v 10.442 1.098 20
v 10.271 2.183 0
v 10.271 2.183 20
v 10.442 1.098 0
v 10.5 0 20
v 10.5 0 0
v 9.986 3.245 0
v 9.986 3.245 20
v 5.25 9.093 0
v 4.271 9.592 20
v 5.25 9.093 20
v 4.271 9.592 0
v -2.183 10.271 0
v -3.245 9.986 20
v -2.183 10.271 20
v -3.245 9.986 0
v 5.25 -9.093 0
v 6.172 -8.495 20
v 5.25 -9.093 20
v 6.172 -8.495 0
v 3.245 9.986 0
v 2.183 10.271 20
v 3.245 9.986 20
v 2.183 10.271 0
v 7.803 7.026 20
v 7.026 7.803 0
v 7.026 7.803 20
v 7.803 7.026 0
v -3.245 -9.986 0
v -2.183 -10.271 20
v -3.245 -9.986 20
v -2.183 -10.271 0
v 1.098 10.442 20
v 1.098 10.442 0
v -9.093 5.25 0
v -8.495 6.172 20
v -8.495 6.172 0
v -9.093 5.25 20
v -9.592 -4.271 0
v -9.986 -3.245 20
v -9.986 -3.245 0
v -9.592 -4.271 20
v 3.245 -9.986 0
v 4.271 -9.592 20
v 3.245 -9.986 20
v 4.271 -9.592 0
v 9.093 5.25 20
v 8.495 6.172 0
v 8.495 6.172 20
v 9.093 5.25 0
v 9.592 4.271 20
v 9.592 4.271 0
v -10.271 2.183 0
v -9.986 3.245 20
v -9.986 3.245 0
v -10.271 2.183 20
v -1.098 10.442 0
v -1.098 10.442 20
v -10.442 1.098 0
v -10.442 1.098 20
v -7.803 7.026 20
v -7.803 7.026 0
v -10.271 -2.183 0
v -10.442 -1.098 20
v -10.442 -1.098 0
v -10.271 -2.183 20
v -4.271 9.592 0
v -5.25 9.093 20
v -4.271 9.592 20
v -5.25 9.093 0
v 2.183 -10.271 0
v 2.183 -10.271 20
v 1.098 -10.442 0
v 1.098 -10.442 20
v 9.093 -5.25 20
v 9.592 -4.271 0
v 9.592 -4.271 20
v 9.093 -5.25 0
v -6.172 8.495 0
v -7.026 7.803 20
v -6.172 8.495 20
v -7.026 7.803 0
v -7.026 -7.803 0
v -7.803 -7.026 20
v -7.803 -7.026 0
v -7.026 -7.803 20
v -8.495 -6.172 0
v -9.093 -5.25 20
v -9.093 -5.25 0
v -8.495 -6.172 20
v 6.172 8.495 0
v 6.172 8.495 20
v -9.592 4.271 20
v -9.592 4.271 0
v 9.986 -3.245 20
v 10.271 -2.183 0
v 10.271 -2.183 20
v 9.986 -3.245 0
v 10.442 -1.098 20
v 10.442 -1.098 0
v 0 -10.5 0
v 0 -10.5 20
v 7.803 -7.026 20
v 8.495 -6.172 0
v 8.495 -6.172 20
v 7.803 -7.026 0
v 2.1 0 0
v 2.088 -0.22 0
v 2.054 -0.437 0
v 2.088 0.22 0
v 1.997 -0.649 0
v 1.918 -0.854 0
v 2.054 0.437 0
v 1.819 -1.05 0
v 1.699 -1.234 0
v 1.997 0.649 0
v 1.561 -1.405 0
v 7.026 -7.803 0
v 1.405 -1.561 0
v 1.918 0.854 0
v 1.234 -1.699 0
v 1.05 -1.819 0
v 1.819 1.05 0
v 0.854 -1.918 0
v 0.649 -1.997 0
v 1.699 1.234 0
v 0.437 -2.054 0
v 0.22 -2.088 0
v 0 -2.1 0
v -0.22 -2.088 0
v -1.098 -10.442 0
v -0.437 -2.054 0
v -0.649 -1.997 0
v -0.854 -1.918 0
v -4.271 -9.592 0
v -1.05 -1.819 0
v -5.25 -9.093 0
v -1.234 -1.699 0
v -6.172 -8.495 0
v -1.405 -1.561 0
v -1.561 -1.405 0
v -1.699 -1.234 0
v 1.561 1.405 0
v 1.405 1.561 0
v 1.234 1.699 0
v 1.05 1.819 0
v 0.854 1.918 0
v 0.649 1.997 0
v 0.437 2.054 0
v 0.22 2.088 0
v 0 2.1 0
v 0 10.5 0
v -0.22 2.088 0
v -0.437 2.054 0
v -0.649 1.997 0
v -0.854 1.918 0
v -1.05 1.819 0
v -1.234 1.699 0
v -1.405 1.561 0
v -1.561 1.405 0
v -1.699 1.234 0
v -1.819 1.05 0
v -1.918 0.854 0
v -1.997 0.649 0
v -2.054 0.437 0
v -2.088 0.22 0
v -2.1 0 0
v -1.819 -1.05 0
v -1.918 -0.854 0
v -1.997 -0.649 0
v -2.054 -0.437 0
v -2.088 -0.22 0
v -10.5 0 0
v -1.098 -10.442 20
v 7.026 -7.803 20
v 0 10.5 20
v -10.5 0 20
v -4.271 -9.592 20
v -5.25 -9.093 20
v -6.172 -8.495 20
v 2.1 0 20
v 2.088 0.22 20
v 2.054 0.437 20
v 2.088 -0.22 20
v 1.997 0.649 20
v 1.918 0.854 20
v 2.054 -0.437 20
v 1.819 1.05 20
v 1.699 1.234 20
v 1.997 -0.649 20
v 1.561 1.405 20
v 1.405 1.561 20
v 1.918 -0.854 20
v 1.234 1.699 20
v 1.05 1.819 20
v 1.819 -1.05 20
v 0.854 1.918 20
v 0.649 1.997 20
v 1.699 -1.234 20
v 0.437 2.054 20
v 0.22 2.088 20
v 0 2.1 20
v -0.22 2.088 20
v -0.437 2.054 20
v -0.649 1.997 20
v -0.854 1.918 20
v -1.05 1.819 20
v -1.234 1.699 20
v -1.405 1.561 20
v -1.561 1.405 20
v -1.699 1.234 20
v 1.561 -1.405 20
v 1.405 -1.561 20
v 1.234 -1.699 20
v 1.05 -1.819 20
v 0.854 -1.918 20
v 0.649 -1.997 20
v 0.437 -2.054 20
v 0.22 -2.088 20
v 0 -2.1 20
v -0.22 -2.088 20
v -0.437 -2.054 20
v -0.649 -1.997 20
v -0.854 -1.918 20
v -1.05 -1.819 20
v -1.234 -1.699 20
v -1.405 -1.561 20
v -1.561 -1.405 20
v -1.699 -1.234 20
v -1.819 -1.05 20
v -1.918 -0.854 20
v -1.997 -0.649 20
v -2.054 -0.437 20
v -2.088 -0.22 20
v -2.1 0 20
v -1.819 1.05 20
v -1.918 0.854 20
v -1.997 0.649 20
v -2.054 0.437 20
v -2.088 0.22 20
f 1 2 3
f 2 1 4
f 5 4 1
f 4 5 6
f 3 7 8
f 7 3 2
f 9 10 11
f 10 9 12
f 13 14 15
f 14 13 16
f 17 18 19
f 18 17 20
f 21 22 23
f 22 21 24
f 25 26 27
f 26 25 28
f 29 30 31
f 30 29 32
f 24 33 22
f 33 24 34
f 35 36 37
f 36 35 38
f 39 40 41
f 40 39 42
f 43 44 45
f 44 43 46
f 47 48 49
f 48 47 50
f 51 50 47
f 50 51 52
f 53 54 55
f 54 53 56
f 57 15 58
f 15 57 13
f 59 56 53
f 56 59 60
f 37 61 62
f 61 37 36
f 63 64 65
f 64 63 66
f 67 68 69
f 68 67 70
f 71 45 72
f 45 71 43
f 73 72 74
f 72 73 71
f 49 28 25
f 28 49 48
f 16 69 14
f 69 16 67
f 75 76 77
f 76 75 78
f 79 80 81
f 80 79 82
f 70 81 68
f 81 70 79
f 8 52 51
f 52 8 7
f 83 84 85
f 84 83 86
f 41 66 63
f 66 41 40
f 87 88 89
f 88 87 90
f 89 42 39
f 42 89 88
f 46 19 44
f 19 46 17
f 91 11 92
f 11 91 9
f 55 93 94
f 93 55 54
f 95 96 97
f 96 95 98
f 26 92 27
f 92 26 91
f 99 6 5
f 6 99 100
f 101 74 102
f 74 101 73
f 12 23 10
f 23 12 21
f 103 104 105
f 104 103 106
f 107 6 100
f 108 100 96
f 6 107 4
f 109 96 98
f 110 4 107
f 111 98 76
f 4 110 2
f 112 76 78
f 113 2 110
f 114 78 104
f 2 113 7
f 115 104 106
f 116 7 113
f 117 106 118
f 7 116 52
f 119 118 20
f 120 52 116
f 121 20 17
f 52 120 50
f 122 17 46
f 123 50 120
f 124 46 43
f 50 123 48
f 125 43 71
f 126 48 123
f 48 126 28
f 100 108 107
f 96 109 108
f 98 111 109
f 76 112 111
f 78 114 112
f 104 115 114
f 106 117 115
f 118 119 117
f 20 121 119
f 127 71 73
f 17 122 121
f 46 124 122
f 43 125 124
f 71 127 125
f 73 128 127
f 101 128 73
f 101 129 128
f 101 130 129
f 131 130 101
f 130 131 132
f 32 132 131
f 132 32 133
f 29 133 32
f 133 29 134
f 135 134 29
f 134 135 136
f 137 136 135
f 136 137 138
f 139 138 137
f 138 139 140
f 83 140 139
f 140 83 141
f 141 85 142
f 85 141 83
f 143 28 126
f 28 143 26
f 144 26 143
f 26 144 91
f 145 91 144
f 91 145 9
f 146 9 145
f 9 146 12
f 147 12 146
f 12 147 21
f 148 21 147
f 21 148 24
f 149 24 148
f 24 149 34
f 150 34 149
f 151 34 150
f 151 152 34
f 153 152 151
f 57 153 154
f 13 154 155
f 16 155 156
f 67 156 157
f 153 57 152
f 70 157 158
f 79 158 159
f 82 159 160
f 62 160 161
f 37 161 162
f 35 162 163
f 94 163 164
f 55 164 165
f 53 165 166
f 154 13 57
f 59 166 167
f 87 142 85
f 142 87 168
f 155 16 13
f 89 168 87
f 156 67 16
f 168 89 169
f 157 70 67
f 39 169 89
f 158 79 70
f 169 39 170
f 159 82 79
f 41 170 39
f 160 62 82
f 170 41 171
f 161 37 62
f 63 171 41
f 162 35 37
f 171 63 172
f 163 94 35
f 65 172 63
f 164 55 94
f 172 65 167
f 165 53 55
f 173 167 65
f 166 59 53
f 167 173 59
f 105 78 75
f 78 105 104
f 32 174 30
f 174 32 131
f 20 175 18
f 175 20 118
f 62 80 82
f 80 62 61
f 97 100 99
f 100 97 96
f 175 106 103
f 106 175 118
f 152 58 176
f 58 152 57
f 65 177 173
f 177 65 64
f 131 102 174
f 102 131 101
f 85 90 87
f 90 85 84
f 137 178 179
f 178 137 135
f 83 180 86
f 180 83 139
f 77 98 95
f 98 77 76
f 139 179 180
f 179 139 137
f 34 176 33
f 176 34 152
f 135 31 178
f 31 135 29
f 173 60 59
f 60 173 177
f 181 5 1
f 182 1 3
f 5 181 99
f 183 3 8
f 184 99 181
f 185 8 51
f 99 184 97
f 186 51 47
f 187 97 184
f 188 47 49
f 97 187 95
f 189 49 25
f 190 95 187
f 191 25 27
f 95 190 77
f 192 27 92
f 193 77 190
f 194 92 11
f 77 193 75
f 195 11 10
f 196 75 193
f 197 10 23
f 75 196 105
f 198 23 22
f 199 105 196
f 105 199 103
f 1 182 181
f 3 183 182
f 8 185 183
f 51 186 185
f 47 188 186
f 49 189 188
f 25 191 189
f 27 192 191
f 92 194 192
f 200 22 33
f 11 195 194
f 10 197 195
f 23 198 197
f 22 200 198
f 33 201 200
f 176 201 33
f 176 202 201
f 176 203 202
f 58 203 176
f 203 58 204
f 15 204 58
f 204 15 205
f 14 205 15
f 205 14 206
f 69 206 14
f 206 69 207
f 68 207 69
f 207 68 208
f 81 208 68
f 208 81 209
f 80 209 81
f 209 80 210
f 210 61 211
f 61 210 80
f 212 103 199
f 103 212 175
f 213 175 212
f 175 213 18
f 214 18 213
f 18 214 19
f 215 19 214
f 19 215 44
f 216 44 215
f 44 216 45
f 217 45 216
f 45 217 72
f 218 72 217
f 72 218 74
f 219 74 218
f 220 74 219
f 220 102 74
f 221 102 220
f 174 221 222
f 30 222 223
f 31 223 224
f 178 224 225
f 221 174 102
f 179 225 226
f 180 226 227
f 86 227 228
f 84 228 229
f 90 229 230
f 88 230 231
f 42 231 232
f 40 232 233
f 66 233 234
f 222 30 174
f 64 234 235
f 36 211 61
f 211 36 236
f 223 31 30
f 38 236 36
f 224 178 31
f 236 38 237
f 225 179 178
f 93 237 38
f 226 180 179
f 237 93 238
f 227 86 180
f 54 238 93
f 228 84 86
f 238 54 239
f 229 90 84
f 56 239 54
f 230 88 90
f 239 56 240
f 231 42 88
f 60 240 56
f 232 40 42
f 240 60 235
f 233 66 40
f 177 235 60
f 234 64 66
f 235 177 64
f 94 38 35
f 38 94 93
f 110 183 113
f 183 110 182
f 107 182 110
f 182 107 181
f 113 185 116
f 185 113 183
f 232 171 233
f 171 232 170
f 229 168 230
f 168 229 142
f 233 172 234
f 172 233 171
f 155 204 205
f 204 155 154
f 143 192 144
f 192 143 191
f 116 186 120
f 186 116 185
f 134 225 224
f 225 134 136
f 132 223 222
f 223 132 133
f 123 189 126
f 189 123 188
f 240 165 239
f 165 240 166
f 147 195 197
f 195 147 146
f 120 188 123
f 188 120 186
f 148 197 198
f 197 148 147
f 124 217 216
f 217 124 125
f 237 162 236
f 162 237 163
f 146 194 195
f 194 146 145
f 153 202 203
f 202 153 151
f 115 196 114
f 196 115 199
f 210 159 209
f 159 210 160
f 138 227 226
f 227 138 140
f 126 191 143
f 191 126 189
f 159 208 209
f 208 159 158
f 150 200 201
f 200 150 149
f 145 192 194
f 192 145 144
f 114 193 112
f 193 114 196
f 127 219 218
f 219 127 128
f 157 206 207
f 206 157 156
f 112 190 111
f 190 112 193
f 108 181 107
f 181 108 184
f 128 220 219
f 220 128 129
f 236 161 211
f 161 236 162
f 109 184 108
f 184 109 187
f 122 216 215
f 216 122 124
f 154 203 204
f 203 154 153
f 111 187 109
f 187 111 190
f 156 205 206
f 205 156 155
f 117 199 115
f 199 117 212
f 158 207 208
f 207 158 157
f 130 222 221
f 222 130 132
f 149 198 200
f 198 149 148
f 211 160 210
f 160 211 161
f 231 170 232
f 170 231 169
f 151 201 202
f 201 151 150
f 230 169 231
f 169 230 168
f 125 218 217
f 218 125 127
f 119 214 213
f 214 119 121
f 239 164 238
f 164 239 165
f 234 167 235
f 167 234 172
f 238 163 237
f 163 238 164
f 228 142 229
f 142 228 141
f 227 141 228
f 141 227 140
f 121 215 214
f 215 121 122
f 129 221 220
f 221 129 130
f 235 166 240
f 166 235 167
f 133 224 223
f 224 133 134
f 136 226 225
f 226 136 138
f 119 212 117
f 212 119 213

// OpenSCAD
//Rolle21mm

difference(){
cylinder(h=20, r=10.5, $fn=60);
	translate([0,0,-0.1])
	cylinder(h=30, r=2.1, $fn=60);
}
